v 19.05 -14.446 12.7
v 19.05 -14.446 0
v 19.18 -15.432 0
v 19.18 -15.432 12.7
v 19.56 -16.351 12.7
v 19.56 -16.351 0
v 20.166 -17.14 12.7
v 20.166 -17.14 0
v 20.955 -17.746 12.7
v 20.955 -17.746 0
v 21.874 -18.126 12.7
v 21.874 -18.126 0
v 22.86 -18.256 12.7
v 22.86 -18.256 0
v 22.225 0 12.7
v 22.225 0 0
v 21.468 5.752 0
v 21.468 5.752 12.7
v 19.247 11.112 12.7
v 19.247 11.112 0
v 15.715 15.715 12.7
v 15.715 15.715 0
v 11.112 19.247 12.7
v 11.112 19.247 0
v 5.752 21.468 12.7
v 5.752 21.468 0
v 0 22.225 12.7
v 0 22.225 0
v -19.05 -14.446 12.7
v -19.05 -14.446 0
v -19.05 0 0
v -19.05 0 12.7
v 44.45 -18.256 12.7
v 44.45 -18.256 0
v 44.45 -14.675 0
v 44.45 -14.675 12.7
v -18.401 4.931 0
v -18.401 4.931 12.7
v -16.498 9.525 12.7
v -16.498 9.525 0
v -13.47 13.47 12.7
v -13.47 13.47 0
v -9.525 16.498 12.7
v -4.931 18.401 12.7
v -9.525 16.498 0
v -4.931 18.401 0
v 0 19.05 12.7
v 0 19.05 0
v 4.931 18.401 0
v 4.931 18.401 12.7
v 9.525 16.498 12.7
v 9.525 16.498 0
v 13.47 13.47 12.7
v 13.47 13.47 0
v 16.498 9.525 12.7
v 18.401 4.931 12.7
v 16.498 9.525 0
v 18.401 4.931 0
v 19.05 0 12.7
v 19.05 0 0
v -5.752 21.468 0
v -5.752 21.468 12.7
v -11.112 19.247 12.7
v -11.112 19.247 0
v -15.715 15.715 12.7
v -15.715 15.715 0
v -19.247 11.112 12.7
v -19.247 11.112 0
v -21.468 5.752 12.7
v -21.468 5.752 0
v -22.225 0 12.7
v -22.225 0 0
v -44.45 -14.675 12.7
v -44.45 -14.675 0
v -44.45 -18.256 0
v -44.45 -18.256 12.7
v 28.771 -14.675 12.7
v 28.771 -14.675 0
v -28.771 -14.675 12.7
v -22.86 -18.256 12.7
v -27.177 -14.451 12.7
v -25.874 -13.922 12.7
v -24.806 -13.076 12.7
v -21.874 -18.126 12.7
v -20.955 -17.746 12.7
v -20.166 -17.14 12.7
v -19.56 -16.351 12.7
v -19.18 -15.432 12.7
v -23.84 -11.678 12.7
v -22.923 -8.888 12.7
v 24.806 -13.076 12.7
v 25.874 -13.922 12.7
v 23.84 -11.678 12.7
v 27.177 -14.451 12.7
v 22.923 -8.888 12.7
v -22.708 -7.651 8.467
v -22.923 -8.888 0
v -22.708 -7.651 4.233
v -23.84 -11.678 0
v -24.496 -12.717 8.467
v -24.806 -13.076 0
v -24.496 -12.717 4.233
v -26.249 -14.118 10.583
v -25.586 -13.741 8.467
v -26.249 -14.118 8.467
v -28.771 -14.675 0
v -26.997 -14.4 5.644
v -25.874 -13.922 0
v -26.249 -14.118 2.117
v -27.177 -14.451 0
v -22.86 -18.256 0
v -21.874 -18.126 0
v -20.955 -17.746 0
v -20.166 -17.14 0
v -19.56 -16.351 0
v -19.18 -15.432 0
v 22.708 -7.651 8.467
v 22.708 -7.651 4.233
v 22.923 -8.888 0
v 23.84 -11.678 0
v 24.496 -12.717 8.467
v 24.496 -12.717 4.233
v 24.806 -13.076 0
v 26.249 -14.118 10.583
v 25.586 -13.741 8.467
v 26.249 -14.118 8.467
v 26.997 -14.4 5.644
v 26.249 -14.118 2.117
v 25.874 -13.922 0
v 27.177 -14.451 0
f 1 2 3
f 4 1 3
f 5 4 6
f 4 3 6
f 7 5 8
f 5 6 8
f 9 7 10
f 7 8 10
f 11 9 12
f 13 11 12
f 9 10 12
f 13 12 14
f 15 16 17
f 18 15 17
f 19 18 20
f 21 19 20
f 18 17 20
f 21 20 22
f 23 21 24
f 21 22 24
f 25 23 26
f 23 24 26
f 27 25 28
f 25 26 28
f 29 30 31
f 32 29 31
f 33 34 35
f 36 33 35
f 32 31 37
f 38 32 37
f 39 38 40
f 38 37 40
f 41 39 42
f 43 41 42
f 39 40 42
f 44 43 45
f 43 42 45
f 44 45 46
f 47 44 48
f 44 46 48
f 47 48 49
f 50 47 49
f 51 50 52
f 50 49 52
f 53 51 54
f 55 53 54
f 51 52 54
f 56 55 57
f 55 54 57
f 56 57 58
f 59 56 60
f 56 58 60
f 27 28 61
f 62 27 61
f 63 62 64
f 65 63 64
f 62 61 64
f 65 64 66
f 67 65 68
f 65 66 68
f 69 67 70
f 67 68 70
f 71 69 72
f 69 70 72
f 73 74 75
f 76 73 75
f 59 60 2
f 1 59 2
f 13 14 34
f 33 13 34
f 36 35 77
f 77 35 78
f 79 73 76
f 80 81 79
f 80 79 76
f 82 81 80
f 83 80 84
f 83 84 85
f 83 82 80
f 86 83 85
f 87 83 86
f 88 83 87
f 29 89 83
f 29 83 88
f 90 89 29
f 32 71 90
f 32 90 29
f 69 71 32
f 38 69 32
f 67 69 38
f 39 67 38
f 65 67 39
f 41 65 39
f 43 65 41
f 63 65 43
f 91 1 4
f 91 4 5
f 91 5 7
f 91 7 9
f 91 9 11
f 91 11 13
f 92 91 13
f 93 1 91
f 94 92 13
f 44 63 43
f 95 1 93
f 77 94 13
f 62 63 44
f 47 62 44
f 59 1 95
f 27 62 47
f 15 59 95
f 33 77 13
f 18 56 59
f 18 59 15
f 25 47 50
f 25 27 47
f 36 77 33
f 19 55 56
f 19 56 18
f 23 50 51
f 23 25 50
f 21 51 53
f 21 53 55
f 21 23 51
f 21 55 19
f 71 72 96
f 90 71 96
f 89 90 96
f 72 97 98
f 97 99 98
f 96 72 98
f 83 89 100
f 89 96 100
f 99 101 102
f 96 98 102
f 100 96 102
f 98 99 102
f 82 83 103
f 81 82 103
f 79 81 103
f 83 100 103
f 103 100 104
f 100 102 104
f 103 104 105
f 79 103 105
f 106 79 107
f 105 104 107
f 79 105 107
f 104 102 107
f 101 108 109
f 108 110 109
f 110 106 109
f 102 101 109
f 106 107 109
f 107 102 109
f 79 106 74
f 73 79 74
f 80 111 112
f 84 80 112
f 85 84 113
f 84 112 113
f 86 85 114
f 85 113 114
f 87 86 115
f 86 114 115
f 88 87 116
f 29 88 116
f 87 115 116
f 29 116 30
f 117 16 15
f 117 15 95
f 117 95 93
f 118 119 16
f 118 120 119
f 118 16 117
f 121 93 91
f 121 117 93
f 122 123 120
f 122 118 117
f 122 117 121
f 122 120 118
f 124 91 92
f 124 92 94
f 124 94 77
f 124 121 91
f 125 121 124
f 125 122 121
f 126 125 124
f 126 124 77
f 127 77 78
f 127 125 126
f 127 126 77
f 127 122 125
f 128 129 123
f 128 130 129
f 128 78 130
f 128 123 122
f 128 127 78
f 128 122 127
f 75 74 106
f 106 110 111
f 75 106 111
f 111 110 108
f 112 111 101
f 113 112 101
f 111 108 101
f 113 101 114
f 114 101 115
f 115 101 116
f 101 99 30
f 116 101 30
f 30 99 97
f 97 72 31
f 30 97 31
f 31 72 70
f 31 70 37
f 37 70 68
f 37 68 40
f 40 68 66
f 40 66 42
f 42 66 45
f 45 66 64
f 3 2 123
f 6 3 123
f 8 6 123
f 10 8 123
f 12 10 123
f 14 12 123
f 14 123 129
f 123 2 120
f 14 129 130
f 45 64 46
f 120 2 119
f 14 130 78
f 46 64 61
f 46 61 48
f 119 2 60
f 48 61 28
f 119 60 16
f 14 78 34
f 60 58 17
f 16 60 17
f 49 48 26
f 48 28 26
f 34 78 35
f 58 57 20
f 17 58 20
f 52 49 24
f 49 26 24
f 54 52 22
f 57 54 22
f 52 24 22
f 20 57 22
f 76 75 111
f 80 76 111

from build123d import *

# Parameters (mm, degrees)
F1_DEPTH = 12.7


with BuildPart() as f1:
    # F0 (on Top) → F1 (new body)
    with BuildSketch(Plane.XY):
        with BuildLine():
            ThreePointArc((0, 19.05), (13.470384, 13.470384), (19.05, 0))
            Line((19.05, 0), (19.05, -14.44625))
            ThreePointArc((19.05, -14.44625), (20.165923, -17.140327), (22.86, -18.25625))
            Line((22.86, -18.25625), (44.45, -18.25625))
            Line((44.45, -18.25625), (44.45, -14.675071))
            Line((44.45, -14.675071), (28.770535, -14.675071))
            add(Edge.make_bspline(
                [(22.225, 0), (22.447722, -8.768542), (22.86, -14.44625), (28.770535, -14.675071)],
                knots=[0, 0, 0, 0, 16.068657, 16.068657, 16.068657, 16.068657], degree=3))
            ThreePointArc((22.225, 0), (15.715448, 15.715448), (0, 22.225))
            ThreePointArc((0, 22.225), (-15.715448, 15.715448), (-22.225, 0))
            add(Edge.make_bspline(
                [(-22.225, 0), (-22.447722, -8.768542), (-22.86, -14.44625), (-28.770535, -14.675071)],
                knots=[0, 0, 0, 0, 16.068657, 16.068657, 16.068657, 16.068657], degree=3))
            Line((-28.770535, -14.675071), (-44.45, -14.675071))
            Line((-44.45, -14.675071), (-44.45, -18.25625))
            Line((-44.45, -18.25625), (-22.86, -18.25625))
            ThreePointArc((-22.86, -18.25625), (-20.165923, -17.140327), (-19.05, -14.44625))
            Line((-19.05, -14.44625), (-19.05, 0))
            ThreePointArc((-19.05, 0), (-13.470384, 13.470384), (0, 19.05))
        make_face()
    extrude(amount=F1_DEPTH)


solid = f1.part
